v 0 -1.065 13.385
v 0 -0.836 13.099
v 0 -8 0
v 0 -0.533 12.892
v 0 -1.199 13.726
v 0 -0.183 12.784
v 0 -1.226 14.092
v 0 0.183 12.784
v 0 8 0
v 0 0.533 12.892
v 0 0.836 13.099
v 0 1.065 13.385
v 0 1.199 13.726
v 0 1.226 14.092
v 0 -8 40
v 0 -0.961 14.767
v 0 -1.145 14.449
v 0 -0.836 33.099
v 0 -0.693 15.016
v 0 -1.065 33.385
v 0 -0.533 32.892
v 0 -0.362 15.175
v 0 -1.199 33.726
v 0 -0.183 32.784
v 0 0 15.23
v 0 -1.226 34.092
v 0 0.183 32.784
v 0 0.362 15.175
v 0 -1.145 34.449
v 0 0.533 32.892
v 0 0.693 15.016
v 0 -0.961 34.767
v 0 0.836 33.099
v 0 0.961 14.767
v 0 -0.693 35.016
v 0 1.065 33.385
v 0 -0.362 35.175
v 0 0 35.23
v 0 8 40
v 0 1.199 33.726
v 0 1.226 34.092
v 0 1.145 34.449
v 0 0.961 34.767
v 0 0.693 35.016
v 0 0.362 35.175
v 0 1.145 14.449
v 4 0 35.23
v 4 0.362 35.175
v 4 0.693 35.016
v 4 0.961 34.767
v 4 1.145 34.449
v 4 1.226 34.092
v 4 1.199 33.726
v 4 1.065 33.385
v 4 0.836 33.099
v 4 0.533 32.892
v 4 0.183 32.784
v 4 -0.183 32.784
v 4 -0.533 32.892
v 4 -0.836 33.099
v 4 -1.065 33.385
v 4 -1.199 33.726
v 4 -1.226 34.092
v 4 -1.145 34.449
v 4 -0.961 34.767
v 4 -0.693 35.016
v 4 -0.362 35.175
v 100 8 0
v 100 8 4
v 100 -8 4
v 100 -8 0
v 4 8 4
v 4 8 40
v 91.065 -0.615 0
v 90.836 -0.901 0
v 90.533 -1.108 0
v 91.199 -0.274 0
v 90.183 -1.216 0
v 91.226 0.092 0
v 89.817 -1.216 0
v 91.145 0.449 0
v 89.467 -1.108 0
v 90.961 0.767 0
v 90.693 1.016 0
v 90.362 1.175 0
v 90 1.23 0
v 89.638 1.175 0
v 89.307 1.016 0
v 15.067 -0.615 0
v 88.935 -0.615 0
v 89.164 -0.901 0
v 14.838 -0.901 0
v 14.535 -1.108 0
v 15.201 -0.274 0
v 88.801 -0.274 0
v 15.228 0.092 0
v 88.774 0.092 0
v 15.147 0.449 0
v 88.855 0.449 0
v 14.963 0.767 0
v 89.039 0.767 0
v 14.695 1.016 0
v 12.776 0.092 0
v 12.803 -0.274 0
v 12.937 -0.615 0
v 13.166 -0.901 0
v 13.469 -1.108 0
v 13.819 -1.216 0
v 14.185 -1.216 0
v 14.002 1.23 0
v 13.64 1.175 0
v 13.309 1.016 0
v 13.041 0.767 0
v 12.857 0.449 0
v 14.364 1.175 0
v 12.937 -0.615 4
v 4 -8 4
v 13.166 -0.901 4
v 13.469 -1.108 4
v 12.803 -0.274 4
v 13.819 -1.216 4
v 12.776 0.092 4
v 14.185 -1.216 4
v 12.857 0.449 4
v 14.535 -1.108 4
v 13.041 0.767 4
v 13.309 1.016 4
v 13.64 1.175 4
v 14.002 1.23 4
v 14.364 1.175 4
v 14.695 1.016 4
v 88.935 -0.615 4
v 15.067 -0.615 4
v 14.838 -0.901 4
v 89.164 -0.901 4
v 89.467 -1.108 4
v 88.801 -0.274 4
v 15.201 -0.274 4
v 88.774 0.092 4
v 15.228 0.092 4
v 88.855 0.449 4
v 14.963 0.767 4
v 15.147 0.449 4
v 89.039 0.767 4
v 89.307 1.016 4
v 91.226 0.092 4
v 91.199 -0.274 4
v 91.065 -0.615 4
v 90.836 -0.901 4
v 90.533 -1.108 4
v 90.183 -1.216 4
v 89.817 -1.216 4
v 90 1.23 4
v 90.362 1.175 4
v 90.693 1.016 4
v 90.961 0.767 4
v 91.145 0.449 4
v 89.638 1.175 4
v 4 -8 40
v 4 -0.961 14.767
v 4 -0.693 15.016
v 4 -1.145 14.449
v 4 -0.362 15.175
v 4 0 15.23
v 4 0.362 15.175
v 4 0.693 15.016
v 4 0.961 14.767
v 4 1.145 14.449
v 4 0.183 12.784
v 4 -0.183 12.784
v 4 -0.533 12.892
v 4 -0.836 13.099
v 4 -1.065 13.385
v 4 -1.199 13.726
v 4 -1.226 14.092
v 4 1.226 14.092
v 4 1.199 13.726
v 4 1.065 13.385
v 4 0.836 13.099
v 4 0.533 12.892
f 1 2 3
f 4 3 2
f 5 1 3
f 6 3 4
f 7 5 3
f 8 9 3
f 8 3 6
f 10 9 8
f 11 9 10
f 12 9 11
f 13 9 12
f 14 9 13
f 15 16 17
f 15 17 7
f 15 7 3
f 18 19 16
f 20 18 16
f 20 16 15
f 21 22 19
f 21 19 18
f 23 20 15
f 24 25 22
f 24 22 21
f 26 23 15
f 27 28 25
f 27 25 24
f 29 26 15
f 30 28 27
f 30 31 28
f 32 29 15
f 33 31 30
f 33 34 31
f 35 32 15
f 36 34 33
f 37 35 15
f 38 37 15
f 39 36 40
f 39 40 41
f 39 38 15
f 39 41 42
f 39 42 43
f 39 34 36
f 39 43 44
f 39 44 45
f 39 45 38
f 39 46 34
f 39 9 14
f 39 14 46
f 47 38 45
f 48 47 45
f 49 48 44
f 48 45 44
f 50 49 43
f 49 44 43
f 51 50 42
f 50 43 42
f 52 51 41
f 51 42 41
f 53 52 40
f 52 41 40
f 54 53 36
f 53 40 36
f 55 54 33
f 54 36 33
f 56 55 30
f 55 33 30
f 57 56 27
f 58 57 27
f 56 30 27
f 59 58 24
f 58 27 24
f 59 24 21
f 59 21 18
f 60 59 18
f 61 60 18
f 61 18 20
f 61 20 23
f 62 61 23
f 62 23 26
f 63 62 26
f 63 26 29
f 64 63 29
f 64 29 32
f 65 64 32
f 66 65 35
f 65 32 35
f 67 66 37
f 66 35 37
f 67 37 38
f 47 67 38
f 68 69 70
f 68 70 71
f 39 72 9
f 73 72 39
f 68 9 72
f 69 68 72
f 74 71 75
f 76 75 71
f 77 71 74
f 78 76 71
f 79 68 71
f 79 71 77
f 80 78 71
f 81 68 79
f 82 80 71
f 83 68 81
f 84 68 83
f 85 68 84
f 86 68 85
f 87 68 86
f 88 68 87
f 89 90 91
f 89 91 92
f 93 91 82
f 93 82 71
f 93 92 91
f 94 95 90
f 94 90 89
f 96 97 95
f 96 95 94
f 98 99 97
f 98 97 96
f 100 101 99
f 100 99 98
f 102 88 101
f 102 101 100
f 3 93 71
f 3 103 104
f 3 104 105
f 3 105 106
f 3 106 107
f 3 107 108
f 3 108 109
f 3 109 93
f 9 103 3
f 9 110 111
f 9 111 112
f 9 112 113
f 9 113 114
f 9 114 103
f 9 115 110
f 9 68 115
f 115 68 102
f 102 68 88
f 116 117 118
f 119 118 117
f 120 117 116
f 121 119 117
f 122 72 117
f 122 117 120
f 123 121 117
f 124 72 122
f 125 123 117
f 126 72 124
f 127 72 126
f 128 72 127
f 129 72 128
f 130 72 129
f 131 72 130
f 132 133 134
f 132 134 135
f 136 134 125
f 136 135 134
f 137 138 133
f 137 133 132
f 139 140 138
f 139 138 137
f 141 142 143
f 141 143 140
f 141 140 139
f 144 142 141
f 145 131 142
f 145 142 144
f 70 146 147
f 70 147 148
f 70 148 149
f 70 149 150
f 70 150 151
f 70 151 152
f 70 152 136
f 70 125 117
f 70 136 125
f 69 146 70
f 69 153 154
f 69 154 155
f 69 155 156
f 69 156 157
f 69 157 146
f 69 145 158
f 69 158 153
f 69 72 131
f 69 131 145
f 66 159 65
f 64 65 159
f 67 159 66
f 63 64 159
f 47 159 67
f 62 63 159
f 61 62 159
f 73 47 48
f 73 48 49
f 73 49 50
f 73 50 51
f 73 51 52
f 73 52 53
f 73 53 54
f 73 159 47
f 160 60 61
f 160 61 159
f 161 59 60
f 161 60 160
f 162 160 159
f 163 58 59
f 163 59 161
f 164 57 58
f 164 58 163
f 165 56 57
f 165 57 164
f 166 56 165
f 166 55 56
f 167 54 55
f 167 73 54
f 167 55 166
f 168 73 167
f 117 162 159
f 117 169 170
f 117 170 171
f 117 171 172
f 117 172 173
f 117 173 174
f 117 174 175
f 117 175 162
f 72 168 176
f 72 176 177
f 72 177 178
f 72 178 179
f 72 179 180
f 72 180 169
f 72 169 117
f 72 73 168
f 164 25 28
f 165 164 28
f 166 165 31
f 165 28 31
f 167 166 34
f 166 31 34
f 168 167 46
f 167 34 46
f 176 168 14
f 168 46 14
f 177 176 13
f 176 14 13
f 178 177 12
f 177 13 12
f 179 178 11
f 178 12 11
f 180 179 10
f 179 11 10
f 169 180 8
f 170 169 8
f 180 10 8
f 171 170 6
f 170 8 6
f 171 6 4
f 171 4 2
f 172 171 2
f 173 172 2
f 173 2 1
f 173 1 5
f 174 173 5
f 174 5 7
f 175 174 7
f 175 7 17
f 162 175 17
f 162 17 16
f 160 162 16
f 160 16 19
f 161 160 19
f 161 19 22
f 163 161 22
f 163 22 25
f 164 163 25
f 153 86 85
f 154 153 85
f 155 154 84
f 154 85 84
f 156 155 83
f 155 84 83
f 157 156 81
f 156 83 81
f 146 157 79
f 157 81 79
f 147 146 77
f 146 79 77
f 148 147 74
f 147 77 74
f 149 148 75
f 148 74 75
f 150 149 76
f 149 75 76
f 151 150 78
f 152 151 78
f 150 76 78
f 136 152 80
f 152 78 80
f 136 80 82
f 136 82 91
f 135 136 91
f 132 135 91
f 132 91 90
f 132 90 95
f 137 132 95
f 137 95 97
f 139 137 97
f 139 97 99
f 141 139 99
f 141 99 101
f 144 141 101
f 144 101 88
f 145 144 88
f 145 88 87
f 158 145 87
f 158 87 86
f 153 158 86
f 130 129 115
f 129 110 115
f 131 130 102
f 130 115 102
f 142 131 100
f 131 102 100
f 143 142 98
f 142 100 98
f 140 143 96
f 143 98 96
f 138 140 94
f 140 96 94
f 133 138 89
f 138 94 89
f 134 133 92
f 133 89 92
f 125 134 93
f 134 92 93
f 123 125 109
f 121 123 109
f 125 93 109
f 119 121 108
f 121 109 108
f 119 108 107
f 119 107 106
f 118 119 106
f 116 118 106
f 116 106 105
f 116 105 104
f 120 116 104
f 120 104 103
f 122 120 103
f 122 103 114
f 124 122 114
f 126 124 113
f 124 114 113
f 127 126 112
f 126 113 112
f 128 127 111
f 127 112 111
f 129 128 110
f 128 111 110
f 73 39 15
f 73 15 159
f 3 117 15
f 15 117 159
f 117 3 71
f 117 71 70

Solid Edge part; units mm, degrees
sketch "Sketch1" plane through (0, 0, 0) normal (0, -1, 0) x (1, 0, 0)
  line L0 (0, 0) -> (0, 40)
  line L1 (0, 40) -> (4, 40)
  line L2 (4, 40) -> (4, 4)
  line L3 (4, 4) -> (100, 4)
  line L4 (100, 4) -> (100, 0)
  line L5 (100, 0) -> (0, 0)
  dimension "D1" = 4
  dimension "D2" = 40
  dimension "D3" = 100
  dimension "D4" = 4
extrude "Protrusion1" add sketch "Sketch1" along normal mid plane 16
hole "Hole1" at (0, 0, 14) direction (1, 0, 0) diameter 2.459 end up to next
hole "Hole2" at (0, 0, 34) direction (1, 0, 0) diameter 2.459 end up to next
hole "Bohrung_3" at (14.002, 0, 0) direction (0, 0, 1) diameter 2.459 end up to next
hole "Hole3" at (90, 0, 0) direction (0, 0, 1) diameter 2.459 end up to next
properties material "Aluminiumlegierung:3.3535 , AlMg3, EN-AW 5754"
